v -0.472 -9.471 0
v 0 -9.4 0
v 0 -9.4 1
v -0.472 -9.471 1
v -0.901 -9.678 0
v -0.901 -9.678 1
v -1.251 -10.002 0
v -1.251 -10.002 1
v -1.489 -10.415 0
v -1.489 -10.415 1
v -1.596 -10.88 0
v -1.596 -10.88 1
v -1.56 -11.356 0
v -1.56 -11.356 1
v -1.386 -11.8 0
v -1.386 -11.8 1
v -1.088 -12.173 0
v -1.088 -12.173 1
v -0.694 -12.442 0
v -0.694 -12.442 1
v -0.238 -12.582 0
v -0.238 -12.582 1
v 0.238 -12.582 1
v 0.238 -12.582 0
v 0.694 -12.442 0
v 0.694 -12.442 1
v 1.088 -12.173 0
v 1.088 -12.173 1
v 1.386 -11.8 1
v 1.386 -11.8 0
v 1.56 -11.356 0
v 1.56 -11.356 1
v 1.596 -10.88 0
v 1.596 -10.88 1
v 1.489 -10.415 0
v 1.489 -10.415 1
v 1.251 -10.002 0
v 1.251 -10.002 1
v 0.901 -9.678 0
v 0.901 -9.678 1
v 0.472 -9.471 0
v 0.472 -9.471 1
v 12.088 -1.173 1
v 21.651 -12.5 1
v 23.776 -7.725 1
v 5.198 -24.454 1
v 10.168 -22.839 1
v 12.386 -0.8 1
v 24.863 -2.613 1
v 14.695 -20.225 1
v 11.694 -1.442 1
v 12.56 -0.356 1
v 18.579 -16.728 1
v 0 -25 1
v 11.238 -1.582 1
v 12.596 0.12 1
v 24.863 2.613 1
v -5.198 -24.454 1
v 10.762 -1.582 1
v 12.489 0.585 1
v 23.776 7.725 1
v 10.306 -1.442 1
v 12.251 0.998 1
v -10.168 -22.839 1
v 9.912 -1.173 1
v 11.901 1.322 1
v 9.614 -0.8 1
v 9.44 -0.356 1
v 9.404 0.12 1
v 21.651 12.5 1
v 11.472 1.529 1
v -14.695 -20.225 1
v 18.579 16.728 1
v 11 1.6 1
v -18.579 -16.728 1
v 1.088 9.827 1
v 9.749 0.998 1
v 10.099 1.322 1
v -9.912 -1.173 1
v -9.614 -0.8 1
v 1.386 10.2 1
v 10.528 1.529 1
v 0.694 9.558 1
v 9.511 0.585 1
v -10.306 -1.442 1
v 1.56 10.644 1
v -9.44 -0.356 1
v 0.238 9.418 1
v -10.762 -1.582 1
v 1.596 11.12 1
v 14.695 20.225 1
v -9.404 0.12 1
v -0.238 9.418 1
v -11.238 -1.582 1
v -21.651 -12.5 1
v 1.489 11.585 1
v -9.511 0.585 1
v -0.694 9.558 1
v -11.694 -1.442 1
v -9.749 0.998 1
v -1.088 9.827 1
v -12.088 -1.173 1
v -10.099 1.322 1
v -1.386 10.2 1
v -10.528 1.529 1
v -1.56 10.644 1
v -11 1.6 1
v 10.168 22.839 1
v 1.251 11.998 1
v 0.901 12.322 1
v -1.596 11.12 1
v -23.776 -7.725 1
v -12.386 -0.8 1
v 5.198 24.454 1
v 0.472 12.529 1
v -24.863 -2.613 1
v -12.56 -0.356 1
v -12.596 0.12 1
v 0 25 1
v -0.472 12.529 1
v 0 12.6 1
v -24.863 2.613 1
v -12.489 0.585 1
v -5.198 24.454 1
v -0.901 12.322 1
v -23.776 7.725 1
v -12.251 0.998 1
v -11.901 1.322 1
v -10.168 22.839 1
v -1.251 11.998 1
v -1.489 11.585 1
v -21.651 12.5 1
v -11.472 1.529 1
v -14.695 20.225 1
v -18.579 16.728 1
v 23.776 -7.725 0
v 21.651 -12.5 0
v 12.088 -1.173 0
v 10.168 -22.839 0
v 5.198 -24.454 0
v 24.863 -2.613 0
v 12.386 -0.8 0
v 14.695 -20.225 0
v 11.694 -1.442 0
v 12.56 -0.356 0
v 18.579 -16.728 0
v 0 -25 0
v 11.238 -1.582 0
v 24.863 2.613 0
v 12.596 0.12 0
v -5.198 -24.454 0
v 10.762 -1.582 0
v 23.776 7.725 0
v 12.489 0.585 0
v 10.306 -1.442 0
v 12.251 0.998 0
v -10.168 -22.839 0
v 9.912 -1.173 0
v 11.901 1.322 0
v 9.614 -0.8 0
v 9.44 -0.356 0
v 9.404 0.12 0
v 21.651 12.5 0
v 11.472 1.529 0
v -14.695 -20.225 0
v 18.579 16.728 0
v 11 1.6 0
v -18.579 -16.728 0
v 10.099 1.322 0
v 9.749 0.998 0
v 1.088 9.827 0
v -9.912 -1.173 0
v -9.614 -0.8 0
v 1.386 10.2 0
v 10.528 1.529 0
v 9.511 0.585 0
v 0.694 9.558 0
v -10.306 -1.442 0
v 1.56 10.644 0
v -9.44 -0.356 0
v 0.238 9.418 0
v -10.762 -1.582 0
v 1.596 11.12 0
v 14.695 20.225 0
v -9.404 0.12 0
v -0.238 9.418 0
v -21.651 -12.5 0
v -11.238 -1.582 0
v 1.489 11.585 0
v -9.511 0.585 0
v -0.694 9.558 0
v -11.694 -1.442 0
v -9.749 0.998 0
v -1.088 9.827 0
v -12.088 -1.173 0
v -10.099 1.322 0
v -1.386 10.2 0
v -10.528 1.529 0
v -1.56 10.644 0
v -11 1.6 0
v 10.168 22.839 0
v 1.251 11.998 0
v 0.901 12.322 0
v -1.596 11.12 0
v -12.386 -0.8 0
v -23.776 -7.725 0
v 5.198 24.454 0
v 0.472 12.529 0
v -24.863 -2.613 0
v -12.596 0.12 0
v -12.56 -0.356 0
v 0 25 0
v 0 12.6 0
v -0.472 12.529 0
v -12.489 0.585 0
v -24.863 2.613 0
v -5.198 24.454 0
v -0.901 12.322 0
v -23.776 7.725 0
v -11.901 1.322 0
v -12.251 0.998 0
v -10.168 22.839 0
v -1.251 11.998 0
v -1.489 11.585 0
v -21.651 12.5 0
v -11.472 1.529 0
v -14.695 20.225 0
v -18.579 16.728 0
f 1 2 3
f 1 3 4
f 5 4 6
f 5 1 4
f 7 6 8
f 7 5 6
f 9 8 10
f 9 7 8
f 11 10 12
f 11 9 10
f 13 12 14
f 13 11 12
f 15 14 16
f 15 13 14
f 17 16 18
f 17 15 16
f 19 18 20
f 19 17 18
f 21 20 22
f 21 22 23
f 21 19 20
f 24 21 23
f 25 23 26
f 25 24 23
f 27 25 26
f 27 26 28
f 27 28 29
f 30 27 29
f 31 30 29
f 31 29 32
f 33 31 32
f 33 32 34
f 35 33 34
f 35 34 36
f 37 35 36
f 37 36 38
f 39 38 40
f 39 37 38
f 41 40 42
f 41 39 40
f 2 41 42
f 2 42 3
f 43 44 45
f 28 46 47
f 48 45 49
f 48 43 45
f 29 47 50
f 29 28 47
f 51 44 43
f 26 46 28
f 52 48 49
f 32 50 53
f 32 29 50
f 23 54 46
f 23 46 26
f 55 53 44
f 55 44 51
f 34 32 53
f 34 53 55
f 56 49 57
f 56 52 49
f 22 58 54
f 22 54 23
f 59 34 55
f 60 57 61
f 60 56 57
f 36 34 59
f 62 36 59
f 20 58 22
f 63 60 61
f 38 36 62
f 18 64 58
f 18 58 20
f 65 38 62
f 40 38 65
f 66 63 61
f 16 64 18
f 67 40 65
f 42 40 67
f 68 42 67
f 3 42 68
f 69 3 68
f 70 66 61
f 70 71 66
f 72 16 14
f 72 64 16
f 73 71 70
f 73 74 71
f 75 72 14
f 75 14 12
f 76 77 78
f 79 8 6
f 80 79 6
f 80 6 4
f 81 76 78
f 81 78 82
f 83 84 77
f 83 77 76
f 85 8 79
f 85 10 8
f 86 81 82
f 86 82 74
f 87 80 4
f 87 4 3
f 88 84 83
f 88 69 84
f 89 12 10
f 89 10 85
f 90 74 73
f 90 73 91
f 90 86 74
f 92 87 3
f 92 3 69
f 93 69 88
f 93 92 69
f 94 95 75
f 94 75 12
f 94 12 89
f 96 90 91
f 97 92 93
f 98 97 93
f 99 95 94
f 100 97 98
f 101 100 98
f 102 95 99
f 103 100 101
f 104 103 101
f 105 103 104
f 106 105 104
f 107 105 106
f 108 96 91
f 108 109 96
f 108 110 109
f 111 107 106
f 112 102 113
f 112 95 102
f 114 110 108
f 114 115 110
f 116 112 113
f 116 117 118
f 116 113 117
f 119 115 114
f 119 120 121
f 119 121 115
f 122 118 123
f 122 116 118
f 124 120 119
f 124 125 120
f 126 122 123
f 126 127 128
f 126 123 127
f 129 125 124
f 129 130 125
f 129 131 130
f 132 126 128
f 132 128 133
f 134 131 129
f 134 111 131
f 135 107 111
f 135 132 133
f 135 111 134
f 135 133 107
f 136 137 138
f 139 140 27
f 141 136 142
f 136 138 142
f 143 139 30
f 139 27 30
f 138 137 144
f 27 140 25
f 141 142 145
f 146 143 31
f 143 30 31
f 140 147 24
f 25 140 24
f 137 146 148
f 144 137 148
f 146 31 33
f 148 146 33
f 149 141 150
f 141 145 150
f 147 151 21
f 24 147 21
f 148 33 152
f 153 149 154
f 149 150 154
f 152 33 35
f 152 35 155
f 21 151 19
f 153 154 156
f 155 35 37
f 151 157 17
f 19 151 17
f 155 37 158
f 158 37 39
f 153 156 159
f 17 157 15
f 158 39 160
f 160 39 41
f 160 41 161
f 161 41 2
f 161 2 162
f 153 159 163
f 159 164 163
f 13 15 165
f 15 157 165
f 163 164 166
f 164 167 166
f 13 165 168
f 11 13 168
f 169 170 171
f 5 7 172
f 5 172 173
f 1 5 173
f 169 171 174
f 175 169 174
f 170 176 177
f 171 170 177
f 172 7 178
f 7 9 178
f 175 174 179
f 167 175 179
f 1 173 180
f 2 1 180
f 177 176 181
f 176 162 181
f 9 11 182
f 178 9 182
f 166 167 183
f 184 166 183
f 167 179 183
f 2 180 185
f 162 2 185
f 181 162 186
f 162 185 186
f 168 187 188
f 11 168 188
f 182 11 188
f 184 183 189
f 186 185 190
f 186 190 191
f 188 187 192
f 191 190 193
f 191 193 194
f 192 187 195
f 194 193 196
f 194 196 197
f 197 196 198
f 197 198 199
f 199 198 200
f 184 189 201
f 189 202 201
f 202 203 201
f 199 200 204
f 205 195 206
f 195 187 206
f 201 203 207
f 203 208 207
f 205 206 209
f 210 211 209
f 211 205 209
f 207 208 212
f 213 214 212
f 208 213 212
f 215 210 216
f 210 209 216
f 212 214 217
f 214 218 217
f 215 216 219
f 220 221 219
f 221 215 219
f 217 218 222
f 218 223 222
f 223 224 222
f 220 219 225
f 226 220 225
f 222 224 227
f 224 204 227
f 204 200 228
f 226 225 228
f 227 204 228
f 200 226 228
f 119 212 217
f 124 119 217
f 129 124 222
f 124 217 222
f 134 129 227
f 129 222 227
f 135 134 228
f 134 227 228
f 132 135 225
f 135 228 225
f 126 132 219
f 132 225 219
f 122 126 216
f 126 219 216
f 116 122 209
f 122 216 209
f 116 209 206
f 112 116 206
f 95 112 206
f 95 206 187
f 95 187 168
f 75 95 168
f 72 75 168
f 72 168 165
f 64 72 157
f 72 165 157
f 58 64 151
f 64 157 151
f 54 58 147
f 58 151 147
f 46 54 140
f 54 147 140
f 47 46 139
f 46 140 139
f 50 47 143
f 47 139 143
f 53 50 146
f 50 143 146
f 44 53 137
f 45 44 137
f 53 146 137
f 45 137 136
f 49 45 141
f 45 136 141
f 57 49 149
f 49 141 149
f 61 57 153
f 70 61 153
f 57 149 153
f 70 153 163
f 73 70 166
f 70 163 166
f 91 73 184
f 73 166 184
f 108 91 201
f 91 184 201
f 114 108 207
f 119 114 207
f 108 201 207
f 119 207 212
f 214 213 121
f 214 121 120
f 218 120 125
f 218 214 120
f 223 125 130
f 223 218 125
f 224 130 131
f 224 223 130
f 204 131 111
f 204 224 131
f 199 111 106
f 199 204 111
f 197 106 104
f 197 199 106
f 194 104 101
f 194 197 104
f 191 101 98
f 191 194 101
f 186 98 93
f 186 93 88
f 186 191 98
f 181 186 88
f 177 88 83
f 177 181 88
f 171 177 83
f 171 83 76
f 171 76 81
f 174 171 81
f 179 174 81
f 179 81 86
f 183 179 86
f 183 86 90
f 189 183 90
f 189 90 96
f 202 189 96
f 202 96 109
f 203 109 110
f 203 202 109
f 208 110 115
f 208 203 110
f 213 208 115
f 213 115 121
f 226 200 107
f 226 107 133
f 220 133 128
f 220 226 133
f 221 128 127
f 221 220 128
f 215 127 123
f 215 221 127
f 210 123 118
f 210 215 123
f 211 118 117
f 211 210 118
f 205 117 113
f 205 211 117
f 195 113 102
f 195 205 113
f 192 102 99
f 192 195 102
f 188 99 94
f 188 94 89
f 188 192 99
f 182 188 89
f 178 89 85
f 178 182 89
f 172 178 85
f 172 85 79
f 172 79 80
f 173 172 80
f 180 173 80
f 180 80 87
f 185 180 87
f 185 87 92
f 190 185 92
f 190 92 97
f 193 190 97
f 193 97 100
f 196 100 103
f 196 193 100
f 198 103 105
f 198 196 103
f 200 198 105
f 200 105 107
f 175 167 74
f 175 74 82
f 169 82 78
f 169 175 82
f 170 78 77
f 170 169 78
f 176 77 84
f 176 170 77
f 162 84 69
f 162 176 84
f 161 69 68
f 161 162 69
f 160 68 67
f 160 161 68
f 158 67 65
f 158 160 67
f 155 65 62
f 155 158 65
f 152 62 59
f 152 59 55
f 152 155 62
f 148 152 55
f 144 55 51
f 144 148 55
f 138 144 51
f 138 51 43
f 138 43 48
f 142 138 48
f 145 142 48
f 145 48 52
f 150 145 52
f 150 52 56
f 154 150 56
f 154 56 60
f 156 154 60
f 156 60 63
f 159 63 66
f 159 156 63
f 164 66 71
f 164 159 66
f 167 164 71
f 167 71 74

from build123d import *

# Parameters (mm, degrees)
SKETCH1_R           = 25
SKETCH1_R_2         = 1.6
BOSS_EXTRUDE1_DEPTH = 1


with BuildPart() as part:
    # Sketch1 → Boss-Extrude1 (new body)
    with BuildSketch(Plane(origin=(0, 0, 0), x_dir=(0, 1, 0), z_dir=(0, 0, 1))):
        Circle(SKETCH1_R)
        with Locations((0, 11)):
            Circle(SKETCH1_R_2, mode=Mode.SUBTRACT)
        with Locations((11, 0)):
            Circle(SKETCH1_R_2, mode=Mode.SUBTRACT)
        with Locations((0, -11)):
            Circle(SKETCH1_R_2, mode=Mode.SUBTRACT)
        with Locations((-11, 0)):
            Circle(SKETCH1_R_2, mode=Mode.SUBTRACT)
    extrude(amount=BOSS_EXTRUDE1_DEPTH)


solid = part.part
